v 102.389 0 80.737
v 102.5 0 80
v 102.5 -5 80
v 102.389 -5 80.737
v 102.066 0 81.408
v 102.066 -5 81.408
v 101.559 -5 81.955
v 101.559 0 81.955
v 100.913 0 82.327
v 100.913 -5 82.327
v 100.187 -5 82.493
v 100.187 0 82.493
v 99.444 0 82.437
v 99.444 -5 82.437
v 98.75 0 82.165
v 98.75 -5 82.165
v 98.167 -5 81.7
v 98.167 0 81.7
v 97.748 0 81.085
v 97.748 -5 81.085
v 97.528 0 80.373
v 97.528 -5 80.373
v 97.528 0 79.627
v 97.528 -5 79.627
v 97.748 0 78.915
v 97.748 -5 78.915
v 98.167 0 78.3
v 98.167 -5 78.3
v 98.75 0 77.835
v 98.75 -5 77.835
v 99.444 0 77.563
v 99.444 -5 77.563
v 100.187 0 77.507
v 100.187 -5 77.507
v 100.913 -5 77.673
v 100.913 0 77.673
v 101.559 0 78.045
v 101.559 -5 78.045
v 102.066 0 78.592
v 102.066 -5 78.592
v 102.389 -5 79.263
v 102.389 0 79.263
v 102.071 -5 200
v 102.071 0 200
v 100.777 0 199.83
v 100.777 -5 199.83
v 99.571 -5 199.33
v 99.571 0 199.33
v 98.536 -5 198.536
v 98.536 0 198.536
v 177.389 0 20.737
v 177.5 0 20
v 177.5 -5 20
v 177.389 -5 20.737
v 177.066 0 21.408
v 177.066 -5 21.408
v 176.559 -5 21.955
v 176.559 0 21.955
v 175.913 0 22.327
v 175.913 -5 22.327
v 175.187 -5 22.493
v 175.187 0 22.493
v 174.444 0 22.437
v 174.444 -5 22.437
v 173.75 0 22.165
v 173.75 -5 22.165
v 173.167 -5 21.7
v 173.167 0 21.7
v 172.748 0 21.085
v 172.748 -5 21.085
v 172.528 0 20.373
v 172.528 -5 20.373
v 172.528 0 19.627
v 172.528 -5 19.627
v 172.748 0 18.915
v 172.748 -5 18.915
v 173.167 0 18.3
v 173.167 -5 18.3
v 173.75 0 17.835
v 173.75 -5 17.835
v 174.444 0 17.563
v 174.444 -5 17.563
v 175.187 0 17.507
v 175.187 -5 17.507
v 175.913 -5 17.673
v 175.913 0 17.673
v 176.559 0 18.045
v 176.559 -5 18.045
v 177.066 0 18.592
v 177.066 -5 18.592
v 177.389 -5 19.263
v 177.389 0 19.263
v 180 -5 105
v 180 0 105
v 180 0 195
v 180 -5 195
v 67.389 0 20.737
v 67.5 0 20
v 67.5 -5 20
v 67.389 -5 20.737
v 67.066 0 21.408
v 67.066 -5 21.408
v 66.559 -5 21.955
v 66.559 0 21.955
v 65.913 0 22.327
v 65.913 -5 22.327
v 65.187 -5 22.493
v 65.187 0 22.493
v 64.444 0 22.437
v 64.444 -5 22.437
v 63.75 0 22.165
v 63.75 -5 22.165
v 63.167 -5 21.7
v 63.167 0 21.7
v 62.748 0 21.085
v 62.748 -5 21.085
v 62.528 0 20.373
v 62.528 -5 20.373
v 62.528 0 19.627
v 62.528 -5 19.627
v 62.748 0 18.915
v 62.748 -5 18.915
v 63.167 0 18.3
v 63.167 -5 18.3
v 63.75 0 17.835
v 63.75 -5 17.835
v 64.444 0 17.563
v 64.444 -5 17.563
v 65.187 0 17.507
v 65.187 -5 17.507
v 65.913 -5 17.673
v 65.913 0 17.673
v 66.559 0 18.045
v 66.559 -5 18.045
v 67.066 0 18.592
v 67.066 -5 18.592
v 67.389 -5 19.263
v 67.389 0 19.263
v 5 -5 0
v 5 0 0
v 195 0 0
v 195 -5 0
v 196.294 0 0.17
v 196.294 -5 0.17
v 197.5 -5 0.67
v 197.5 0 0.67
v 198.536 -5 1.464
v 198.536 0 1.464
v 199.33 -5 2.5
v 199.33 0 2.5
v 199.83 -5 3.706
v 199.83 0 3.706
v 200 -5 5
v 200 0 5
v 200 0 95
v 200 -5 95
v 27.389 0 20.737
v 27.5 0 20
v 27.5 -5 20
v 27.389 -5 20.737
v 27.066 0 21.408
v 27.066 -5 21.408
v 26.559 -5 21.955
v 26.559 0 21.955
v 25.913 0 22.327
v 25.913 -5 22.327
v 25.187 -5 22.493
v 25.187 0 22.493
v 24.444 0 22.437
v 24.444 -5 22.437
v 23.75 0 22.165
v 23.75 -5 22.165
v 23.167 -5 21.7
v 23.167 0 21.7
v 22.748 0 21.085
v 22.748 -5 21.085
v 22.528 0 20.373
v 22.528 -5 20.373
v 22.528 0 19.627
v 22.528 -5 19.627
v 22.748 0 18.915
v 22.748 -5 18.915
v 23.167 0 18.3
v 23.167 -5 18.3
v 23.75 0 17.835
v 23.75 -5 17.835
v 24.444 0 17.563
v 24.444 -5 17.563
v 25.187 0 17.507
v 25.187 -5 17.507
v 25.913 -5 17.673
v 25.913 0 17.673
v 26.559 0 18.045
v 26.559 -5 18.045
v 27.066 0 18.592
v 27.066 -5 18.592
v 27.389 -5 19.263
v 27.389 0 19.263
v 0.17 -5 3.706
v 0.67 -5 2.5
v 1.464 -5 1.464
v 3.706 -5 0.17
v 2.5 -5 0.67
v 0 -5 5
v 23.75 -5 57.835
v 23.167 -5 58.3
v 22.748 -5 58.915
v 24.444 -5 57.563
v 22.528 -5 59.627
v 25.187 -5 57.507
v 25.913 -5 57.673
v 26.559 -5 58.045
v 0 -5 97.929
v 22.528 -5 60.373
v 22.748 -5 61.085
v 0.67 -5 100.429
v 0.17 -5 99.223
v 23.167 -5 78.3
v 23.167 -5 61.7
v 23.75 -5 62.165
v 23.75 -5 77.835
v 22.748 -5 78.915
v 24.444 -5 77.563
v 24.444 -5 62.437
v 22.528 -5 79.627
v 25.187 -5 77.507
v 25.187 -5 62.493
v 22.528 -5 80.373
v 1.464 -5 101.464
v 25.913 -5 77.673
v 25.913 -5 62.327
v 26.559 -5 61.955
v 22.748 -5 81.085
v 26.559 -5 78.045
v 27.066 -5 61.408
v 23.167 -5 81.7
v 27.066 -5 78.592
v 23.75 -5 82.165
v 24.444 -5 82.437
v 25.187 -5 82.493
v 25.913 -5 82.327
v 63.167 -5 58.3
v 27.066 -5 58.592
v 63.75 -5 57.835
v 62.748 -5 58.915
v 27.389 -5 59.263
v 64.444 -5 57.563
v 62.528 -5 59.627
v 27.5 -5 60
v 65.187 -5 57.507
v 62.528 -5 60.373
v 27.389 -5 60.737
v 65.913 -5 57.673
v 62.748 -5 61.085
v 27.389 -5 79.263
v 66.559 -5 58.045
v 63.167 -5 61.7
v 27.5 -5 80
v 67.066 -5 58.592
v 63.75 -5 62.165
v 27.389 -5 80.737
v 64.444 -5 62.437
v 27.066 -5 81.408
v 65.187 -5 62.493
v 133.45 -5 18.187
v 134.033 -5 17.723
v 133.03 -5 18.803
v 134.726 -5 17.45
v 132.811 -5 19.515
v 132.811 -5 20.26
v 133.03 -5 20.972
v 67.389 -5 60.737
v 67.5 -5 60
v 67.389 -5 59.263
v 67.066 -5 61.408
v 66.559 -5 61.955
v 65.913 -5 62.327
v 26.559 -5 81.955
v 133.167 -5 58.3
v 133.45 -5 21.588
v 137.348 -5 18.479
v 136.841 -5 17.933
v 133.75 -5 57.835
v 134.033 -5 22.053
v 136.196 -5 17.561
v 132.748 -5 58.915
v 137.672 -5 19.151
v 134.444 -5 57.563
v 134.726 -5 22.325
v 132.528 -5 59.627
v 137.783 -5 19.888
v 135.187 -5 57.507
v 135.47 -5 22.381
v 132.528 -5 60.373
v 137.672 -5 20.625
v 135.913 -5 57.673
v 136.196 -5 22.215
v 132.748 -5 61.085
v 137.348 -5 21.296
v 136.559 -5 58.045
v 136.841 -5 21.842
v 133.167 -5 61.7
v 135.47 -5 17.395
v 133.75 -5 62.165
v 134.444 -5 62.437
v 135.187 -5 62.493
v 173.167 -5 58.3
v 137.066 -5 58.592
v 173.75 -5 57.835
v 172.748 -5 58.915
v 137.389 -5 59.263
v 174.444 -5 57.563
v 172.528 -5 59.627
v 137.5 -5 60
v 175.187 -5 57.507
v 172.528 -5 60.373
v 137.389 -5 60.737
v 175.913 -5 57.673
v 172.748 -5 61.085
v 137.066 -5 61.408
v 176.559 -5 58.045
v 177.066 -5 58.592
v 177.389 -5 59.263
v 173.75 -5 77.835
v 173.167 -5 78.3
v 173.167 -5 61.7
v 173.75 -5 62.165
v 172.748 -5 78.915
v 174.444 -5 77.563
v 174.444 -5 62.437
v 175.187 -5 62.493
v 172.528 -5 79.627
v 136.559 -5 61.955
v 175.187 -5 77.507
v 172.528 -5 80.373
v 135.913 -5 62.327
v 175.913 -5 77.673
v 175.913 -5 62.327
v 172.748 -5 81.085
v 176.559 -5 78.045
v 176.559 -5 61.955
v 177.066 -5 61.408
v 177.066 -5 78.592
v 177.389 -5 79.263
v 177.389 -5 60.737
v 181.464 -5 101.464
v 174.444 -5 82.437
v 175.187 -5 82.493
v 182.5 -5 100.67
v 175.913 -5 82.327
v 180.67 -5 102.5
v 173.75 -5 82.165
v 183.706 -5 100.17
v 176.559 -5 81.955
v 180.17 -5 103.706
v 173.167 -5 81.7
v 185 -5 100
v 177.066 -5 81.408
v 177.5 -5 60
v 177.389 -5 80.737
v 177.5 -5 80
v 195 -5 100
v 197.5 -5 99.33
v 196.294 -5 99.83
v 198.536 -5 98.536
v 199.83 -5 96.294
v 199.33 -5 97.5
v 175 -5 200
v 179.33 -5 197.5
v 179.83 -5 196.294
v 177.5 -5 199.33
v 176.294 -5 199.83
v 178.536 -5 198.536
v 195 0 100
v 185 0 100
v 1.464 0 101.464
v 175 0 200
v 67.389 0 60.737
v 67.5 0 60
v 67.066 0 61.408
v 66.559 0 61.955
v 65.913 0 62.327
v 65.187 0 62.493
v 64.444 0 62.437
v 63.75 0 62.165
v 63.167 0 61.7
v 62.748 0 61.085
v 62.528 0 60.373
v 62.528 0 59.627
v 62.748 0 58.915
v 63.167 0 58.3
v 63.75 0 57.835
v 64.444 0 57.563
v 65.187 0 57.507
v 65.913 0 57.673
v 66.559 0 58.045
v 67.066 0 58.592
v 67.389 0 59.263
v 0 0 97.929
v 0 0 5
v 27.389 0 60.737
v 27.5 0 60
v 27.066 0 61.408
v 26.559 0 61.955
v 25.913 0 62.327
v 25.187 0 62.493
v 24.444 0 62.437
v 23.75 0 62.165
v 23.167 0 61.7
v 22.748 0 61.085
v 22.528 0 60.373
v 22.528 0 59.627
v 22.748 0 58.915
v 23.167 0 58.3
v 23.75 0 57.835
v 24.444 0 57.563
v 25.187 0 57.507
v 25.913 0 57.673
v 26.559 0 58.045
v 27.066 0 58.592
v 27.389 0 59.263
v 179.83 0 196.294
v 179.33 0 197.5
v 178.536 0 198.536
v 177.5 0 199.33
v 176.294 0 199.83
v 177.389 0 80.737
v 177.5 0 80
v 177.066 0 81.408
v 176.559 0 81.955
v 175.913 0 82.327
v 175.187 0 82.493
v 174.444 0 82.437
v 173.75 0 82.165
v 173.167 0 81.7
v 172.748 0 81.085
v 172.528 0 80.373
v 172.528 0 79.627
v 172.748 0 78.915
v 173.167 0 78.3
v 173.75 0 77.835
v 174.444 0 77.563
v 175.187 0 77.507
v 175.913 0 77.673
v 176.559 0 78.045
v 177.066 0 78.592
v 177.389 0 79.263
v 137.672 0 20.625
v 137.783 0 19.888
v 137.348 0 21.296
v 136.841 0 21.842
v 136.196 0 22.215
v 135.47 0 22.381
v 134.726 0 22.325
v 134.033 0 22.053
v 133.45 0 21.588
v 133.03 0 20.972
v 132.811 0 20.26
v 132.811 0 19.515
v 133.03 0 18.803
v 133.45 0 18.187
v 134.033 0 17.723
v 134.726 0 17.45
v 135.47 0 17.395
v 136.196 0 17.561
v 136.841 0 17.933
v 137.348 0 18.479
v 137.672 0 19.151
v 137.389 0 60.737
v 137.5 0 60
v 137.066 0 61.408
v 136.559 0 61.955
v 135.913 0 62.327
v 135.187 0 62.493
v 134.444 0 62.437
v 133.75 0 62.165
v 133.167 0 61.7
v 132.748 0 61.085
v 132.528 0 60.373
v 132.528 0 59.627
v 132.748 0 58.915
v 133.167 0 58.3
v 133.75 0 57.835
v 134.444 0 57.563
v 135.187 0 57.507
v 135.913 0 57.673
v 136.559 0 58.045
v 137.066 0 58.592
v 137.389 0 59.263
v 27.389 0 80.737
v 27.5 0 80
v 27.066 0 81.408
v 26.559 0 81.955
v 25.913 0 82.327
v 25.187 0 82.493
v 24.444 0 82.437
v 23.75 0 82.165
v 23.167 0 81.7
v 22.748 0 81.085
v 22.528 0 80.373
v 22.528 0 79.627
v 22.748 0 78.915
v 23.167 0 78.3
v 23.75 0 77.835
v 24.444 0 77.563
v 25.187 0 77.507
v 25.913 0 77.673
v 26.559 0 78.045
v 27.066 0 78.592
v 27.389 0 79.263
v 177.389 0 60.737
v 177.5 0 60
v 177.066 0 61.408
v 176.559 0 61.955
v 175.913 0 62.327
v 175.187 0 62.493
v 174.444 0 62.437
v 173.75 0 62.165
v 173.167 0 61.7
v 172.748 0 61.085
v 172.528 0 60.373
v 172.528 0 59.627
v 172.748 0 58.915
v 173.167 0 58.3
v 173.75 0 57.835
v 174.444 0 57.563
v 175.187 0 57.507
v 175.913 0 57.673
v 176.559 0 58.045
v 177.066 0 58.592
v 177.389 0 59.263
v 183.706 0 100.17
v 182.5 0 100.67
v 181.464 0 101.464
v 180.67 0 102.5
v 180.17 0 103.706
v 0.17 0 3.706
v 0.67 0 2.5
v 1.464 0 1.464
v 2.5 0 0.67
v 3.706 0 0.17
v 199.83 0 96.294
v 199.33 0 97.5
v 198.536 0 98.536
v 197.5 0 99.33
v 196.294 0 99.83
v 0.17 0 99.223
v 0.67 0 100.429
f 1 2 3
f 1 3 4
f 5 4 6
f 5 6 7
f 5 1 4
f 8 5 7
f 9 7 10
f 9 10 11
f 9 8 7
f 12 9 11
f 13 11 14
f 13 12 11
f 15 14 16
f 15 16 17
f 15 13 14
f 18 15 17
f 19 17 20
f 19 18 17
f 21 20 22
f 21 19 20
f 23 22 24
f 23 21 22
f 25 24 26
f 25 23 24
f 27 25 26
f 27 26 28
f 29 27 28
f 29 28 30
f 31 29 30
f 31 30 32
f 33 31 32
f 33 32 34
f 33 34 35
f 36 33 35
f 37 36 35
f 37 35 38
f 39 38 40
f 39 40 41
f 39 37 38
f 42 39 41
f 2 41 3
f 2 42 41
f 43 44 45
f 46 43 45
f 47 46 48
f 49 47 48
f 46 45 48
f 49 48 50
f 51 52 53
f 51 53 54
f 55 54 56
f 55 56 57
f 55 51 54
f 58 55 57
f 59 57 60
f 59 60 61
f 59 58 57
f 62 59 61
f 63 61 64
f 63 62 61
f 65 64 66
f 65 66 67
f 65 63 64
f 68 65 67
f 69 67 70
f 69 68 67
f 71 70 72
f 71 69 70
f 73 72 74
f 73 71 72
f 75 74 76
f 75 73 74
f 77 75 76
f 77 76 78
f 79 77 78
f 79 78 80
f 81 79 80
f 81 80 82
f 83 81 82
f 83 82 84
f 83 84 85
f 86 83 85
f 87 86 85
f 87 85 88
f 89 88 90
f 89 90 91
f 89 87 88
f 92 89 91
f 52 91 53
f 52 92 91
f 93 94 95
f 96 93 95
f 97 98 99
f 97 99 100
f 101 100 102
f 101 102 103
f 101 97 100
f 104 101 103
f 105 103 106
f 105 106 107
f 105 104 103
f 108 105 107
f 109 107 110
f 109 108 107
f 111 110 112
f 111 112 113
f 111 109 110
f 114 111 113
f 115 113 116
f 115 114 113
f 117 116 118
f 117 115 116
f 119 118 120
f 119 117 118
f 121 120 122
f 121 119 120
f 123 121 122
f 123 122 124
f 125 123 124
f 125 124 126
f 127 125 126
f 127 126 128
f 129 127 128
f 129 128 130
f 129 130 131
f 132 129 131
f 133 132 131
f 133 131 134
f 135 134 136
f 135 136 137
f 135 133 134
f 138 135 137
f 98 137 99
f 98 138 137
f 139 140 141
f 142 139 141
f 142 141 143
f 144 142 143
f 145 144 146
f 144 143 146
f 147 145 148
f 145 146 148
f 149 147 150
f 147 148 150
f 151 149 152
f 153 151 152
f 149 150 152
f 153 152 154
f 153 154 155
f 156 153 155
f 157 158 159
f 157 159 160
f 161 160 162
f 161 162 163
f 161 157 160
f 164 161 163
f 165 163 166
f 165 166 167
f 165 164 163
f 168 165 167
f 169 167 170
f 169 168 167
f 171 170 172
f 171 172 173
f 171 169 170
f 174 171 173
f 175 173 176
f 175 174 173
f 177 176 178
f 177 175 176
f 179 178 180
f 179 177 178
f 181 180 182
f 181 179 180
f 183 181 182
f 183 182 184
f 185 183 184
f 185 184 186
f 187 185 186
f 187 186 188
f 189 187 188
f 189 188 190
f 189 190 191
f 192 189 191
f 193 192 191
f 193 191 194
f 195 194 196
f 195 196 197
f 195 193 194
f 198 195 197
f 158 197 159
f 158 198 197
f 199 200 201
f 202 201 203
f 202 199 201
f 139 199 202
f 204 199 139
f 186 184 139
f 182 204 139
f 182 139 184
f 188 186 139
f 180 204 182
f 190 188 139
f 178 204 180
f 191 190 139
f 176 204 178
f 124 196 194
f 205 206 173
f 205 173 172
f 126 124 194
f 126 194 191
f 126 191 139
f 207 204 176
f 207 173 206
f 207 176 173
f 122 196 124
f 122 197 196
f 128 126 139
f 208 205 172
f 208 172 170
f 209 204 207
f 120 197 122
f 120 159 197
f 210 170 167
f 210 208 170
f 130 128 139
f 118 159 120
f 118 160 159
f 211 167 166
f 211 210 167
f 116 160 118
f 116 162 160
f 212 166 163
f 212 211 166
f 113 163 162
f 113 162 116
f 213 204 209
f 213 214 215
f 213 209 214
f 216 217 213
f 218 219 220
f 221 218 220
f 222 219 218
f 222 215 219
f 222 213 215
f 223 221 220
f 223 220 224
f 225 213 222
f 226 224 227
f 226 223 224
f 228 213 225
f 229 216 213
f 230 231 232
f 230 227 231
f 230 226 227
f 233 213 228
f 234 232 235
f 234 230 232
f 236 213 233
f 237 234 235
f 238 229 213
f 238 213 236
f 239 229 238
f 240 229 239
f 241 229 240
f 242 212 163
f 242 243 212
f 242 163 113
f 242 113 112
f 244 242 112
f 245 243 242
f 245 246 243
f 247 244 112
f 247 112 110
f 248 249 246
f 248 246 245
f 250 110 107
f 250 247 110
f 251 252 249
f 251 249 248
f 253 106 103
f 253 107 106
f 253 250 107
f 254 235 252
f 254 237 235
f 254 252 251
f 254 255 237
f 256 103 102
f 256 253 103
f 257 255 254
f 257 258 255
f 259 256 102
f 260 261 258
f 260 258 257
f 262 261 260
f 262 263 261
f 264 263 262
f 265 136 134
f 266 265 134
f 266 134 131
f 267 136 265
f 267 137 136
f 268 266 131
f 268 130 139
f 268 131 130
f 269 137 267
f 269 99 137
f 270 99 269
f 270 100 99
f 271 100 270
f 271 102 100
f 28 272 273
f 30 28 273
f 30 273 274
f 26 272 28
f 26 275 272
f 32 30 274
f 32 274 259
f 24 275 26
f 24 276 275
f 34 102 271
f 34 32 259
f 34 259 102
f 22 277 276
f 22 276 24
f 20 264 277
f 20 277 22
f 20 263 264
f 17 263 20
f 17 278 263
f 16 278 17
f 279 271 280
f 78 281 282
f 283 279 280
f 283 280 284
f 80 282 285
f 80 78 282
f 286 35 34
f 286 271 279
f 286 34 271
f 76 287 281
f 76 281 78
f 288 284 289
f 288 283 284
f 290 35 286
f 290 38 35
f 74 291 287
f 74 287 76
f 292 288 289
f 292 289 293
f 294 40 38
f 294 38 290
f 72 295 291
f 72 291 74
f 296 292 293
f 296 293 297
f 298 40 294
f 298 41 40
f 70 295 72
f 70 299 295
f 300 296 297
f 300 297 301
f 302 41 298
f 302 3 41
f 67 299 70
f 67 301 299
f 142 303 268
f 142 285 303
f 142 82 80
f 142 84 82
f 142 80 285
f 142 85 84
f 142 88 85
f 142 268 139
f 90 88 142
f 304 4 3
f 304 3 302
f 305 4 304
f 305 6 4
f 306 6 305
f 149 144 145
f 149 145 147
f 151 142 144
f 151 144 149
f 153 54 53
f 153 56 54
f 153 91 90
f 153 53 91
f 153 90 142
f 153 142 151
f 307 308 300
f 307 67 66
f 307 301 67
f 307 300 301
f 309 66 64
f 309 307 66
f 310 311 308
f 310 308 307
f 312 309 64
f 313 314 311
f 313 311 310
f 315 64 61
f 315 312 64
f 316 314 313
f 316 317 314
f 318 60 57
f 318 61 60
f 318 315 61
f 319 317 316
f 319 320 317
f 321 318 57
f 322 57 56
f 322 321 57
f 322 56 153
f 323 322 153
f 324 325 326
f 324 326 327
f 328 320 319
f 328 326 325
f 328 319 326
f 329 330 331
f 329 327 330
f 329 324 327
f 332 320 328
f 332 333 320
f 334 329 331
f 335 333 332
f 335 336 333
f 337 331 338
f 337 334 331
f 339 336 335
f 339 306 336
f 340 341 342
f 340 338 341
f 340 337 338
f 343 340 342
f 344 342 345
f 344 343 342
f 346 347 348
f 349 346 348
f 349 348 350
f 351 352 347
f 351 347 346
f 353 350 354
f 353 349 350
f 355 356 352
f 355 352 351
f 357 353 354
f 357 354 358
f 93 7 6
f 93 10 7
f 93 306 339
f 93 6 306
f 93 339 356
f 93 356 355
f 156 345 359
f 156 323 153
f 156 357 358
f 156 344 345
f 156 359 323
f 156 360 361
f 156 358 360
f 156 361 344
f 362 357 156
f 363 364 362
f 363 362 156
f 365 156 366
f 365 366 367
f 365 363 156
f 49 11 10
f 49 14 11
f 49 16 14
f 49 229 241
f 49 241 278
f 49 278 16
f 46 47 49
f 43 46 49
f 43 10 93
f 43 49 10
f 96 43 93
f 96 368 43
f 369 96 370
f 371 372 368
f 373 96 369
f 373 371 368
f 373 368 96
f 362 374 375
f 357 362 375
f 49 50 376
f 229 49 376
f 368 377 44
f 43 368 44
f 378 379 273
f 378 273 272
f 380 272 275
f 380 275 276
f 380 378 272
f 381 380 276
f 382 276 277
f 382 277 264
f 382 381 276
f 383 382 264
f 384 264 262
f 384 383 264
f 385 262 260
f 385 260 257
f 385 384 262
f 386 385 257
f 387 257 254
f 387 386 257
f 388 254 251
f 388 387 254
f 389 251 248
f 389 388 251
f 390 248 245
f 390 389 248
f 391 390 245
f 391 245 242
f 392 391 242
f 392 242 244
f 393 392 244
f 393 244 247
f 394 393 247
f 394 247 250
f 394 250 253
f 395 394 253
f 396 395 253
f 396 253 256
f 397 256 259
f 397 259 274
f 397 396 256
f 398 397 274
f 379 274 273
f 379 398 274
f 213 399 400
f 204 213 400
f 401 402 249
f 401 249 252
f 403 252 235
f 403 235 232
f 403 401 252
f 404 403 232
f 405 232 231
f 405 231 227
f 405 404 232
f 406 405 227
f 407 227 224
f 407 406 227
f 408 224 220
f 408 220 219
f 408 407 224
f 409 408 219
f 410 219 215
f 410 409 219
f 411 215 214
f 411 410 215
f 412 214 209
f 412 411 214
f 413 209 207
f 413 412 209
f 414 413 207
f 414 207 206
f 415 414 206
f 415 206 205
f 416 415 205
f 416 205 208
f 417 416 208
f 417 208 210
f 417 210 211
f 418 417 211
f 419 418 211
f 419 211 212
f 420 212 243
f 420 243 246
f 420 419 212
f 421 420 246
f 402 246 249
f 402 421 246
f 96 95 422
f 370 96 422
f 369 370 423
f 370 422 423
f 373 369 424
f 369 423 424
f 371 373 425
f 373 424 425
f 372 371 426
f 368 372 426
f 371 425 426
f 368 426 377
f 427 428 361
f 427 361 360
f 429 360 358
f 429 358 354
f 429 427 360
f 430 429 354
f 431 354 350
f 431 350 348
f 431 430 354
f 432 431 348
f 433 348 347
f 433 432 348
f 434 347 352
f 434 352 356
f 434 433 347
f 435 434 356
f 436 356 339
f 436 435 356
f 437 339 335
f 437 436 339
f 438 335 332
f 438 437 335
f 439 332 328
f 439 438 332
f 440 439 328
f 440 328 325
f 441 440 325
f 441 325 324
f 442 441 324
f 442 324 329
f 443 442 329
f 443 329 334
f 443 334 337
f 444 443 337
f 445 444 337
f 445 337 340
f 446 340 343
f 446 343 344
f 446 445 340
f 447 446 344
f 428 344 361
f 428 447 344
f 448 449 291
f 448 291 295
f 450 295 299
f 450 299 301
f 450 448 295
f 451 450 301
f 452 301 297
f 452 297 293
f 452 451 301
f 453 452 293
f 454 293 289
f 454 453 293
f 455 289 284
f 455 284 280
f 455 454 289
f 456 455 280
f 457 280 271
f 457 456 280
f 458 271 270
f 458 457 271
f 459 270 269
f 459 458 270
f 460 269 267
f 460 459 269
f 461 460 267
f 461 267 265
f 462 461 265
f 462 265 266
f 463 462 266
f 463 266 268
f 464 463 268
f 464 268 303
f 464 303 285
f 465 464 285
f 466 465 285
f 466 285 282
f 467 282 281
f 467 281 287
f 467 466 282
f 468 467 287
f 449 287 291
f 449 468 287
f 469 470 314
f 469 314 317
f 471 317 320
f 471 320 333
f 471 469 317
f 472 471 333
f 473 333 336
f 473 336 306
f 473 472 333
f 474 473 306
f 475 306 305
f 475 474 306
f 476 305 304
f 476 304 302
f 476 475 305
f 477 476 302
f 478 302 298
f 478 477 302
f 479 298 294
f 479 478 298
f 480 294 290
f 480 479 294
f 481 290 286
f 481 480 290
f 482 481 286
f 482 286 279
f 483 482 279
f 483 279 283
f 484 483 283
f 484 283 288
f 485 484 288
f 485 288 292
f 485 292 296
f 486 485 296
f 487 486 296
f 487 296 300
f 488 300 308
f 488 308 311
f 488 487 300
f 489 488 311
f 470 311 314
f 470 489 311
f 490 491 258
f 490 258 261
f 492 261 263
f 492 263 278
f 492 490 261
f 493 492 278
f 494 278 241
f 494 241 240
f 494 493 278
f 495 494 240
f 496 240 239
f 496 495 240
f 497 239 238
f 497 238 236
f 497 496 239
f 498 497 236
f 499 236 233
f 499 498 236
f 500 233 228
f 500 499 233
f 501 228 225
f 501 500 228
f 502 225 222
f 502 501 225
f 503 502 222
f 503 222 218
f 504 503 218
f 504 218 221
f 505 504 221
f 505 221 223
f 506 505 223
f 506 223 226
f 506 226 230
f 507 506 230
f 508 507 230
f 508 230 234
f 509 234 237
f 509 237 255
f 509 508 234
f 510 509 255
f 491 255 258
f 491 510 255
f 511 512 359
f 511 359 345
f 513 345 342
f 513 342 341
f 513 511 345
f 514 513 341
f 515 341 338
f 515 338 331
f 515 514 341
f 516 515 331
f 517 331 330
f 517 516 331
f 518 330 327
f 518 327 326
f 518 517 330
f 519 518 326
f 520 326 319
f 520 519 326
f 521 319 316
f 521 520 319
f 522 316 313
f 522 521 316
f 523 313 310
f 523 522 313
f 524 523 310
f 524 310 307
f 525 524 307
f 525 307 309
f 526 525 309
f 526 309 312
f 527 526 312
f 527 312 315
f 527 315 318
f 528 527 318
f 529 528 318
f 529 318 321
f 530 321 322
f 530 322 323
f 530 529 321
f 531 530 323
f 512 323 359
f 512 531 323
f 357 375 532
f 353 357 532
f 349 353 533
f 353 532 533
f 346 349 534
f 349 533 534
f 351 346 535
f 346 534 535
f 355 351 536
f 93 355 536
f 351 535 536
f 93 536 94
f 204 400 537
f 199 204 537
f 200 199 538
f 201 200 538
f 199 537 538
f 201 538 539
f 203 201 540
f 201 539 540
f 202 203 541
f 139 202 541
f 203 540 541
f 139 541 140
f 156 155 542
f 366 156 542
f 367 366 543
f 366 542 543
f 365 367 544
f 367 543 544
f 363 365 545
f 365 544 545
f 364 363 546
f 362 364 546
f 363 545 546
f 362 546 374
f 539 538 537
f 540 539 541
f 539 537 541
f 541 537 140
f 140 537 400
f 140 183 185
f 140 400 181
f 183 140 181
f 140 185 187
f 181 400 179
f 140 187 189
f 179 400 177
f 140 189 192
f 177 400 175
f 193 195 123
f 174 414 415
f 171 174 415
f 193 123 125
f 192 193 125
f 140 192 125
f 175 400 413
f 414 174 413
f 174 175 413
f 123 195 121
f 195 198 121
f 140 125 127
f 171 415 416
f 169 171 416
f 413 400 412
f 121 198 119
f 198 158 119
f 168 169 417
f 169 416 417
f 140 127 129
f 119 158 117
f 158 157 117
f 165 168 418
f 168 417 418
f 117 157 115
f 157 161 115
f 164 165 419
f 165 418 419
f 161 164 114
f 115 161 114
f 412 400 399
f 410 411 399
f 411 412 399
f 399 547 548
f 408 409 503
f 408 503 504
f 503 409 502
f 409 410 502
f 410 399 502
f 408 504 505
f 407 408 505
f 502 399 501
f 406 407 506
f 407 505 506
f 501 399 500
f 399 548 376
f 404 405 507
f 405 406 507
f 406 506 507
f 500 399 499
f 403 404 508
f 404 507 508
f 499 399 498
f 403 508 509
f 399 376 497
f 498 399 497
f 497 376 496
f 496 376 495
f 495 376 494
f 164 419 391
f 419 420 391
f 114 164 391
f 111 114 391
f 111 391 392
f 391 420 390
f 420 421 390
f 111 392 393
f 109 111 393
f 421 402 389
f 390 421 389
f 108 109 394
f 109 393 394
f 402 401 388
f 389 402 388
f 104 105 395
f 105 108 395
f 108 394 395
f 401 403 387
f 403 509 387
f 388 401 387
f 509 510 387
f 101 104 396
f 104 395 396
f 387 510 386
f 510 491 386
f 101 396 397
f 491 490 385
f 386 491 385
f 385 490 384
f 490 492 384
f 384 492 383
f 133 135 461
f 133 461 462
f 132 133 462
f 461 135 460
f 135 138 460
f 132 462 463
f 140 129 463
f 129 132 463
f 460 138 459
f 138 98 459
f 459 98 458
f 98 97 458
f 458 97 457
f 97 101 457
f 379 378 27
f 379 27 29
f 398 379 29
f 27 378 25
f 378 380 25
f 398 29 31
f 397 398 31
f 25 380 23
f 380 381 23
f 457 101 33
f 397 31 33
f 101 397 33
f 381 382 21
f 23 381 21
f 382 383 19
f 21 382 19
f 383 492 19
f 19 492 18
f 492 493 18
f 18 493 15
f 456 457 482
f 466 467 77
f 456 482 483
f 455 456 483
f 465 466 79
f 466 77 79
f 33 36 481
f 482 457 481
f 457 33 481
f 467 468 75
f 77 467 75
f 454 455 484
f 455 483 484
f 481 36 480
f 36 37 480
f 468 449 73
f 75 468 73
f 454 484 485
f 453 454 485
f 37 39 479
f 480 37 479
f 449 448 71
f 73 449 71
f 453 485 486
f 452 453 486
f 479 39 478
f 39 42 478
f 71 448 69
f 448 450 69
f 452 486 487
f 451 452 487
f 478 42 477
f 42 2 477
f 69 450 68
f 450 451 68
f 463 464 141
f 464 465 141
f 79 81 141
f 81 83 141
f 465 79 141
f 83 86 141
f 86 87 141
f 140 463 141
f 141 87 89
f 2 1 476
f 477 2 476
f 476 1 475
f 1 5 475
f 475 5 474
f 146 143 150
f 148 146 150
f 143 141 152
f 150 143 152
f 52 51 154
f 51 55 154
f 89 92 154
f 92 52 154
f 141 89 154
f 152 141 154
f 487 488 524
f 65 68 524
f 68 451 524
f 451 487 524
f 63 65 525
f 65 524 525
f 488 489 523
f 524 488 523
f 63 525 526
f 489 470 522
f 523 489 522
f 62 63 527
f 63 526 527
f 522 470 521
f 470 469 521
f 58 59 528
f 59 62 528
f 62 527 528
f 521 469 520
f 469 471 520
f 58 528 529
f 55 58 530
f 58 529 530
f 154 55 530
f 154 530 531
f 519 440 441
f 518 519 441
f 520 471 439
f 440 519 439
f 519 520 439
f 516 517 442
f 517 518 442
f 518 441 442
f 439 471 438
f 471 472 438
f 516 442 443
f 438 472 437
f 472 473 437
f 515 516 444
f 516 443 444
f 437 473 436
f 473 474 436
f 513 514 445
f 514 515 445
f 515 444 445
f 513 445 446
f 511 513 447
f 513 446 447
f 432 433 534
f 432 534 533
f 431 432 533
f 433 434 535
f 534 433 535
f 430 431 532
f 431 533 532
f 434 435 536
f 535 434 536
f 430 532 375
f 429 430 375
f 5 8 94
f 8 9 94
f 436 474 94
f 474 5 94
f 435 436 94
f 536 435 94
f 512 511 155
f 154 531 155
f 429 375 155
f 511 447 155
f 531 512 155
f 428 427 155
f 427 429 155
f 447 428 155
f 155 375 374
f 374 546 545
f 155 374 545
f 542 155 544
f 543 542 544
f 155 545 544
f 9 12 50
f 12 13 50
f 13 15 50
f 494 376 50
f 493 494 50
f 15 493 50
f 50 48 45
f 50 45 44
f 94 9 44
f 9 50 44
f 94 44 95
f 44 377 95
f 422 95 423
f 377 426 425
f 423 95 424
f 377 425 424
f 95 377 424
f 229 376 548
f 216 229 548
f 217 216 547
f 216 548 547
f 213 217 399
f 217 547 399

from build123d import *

# Parameters (mm, degrees)
F0_R     = 2.5
F1_DEPTH = 5


with BuildPart() as f1:
    # F0 (on Front) → F1 (new body)
    with BuildSketch(Plane.XZ):
        with BuildLine():
            Line((0, 97.928932), (0, 5))
            ThreePointArc((0, 5), (1.464466, 1.464466), (5, 0))
            Line((5, 0), (195, 0))
            ThreePointArc((195, 0), (198.535534, 1.464466), (200, 5))
            Line((200, 5), (200, 95))
            ThreePointArc((200, 95), (198.535534, 98.535534), (195, 100))
            Line((195, 100), (185, 100))
            ThreePointArc((185, 100), (181.464466, 101.464466), (180, 105))
            Line((180, 105), (180, 195))
            ThreePointArc((180, 195), (178.535534, 198.535534), (175, 200))
            Line((175, 200), (102.071068, 200))
            ThreePointArc((102.071068, 200), (100.157651, 199.619398), (98.535534, 198.535534))
            Line((98.535534, 198.535534), (1.464466, 101.464466))
            ThreePointArc((1.464466, 101.464466), (0.380602, 99.842349), (0, 97.928932))
        make_face()
        with Locations((25, 20)):
            Circle(F0_R, mode=Mode.SUBTRACT)
        with Locations((65, 20)):
            Circle(F0_R, mode=Mode.SUBTRACT)
        with Locations((25, 60)):
            Circle(F0_R, mode=Mode.SUBTRACT)
        with Locations((25, 80)):
            Circle(F0_R, mode=Mode.SUBTRACT)
        with Locations((65, 60)):
            Circle(F0_R, mode=Mode.SUBTRACT)
        with Locations((135.282773, 19.887757)):
            Circle(F0_R, mode=Mode.SUBTRACT)
        with Locations((175, 20)):
            Circle(F0_R, mode=Mode.SUBTRACT)
        with Locations((135, 60)):
            Circle(F0_R, mode=Mode.SUBTRACT)
        with Locations((100, 80)):
            Circle(F0_R, mode=Mode.SUBTRACT)
        with Locations((175, 60)):
            Circle(F0_R, mode=Mode.SUBTRACT)
        with Locations((175, 80)):
            Circle(F0_R, mode=Mode.SUBTRACT)
    extrude(amount=F1_DEPTH)


solid = f1.part
